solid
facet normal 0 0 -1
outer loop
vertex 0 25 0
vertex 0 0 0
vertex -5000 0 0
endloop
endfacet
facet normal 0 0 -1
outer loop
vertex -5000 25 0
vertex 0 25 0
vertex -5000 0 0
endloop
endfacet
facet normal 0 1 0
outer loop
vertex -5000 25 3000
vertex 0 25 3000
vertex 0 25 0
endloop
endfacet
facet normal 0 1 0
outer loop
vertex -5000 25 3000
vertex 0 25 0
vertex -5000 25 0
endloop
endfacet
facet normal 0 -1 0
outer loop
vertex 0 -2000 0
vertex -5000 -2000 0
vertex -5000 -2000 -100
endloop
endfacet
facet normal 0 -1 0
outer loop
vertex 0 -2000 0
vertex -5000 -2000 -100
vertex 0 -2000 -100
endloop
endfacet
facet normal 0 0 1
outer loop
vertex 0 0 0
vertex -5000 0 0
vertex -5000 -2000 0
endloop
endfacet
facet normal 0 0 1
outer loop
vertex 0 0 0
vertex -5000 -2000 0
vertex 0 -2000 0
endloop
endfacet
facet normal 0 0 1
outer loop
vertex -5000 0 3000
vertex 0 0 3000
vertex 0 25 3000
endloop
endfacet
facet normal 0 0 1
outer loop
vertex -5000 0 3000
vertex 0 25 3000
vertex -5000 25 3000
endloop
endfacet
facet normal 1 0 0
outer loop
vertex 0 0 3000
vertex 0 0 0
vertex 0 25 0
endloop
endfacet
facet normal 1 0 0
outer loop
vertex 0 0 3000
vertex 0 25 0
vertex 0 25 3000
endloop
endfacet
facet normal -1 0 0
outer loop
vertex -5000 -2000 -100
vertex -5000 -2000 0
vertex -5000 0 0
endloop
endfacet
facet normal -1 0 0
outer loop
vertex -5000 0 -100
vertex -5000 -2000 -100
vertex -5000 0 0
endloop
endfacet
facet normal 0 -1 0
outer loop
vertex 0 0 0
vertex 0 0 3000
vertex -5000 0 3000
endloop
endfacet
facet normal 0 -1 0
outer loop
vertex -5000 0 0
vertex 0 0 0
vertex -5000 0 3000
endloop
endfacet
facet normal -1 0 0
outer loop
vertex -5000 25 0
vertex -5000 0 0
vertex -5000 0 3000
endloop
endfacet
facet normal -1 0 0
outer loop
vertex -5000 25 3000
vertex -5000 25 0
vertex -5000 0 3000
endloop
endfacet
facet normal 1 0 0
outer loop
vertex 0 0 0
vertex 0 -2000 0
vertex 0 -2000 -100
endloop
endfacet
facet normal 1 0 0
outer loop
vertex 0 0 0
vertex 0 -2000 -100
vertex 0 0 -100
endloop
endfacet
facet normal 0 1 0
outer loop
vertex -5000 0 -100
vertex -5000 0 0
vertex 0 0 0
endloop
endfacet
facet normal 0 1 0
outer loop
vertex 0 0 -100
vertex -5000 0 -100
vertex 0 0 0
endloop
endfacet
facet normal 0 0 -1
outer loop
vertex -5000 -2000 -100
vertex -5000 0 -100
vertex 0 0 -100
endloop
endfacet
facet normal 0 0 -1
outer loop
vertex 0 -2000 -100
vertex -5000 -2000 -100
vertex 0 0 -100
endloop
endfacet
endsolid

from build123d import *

# Parameters (mm, degrees)
F0_W     = 5000
F0_H     = 2000
F1_DEPTH = 100
F2_W     = 5000
F2_H     = 3000
F3_DEPTH = 25


# Not quite as in the source:
# - the program builds the solid bodies; features that only make, move or delete a surface that nothing else refers to are left out


with BuildPart() as f1:
    # F0 (on Top) → F1 (new body)
    with BuildSketch(Plane.XY):
        with Locations((-2500, -1000)):
            Rectangle(F0_W, F0_H)
    extrude(amount=-F1_DEPTH)


with BuildPart() as f3:
    # F2 (on face) → F3 (new body)
    with BuildSketch(Plane(origin=(0, 0, 0), x_dir=(-1, 0, 0), z_dir=(0, 1, 0))):
        with Locations((2500, 1500)):
            Rectangle(F2_W, F2_H)
    extrude(amount=F3_DEPTH)


solid = Compound([f1.part, f3.part])
